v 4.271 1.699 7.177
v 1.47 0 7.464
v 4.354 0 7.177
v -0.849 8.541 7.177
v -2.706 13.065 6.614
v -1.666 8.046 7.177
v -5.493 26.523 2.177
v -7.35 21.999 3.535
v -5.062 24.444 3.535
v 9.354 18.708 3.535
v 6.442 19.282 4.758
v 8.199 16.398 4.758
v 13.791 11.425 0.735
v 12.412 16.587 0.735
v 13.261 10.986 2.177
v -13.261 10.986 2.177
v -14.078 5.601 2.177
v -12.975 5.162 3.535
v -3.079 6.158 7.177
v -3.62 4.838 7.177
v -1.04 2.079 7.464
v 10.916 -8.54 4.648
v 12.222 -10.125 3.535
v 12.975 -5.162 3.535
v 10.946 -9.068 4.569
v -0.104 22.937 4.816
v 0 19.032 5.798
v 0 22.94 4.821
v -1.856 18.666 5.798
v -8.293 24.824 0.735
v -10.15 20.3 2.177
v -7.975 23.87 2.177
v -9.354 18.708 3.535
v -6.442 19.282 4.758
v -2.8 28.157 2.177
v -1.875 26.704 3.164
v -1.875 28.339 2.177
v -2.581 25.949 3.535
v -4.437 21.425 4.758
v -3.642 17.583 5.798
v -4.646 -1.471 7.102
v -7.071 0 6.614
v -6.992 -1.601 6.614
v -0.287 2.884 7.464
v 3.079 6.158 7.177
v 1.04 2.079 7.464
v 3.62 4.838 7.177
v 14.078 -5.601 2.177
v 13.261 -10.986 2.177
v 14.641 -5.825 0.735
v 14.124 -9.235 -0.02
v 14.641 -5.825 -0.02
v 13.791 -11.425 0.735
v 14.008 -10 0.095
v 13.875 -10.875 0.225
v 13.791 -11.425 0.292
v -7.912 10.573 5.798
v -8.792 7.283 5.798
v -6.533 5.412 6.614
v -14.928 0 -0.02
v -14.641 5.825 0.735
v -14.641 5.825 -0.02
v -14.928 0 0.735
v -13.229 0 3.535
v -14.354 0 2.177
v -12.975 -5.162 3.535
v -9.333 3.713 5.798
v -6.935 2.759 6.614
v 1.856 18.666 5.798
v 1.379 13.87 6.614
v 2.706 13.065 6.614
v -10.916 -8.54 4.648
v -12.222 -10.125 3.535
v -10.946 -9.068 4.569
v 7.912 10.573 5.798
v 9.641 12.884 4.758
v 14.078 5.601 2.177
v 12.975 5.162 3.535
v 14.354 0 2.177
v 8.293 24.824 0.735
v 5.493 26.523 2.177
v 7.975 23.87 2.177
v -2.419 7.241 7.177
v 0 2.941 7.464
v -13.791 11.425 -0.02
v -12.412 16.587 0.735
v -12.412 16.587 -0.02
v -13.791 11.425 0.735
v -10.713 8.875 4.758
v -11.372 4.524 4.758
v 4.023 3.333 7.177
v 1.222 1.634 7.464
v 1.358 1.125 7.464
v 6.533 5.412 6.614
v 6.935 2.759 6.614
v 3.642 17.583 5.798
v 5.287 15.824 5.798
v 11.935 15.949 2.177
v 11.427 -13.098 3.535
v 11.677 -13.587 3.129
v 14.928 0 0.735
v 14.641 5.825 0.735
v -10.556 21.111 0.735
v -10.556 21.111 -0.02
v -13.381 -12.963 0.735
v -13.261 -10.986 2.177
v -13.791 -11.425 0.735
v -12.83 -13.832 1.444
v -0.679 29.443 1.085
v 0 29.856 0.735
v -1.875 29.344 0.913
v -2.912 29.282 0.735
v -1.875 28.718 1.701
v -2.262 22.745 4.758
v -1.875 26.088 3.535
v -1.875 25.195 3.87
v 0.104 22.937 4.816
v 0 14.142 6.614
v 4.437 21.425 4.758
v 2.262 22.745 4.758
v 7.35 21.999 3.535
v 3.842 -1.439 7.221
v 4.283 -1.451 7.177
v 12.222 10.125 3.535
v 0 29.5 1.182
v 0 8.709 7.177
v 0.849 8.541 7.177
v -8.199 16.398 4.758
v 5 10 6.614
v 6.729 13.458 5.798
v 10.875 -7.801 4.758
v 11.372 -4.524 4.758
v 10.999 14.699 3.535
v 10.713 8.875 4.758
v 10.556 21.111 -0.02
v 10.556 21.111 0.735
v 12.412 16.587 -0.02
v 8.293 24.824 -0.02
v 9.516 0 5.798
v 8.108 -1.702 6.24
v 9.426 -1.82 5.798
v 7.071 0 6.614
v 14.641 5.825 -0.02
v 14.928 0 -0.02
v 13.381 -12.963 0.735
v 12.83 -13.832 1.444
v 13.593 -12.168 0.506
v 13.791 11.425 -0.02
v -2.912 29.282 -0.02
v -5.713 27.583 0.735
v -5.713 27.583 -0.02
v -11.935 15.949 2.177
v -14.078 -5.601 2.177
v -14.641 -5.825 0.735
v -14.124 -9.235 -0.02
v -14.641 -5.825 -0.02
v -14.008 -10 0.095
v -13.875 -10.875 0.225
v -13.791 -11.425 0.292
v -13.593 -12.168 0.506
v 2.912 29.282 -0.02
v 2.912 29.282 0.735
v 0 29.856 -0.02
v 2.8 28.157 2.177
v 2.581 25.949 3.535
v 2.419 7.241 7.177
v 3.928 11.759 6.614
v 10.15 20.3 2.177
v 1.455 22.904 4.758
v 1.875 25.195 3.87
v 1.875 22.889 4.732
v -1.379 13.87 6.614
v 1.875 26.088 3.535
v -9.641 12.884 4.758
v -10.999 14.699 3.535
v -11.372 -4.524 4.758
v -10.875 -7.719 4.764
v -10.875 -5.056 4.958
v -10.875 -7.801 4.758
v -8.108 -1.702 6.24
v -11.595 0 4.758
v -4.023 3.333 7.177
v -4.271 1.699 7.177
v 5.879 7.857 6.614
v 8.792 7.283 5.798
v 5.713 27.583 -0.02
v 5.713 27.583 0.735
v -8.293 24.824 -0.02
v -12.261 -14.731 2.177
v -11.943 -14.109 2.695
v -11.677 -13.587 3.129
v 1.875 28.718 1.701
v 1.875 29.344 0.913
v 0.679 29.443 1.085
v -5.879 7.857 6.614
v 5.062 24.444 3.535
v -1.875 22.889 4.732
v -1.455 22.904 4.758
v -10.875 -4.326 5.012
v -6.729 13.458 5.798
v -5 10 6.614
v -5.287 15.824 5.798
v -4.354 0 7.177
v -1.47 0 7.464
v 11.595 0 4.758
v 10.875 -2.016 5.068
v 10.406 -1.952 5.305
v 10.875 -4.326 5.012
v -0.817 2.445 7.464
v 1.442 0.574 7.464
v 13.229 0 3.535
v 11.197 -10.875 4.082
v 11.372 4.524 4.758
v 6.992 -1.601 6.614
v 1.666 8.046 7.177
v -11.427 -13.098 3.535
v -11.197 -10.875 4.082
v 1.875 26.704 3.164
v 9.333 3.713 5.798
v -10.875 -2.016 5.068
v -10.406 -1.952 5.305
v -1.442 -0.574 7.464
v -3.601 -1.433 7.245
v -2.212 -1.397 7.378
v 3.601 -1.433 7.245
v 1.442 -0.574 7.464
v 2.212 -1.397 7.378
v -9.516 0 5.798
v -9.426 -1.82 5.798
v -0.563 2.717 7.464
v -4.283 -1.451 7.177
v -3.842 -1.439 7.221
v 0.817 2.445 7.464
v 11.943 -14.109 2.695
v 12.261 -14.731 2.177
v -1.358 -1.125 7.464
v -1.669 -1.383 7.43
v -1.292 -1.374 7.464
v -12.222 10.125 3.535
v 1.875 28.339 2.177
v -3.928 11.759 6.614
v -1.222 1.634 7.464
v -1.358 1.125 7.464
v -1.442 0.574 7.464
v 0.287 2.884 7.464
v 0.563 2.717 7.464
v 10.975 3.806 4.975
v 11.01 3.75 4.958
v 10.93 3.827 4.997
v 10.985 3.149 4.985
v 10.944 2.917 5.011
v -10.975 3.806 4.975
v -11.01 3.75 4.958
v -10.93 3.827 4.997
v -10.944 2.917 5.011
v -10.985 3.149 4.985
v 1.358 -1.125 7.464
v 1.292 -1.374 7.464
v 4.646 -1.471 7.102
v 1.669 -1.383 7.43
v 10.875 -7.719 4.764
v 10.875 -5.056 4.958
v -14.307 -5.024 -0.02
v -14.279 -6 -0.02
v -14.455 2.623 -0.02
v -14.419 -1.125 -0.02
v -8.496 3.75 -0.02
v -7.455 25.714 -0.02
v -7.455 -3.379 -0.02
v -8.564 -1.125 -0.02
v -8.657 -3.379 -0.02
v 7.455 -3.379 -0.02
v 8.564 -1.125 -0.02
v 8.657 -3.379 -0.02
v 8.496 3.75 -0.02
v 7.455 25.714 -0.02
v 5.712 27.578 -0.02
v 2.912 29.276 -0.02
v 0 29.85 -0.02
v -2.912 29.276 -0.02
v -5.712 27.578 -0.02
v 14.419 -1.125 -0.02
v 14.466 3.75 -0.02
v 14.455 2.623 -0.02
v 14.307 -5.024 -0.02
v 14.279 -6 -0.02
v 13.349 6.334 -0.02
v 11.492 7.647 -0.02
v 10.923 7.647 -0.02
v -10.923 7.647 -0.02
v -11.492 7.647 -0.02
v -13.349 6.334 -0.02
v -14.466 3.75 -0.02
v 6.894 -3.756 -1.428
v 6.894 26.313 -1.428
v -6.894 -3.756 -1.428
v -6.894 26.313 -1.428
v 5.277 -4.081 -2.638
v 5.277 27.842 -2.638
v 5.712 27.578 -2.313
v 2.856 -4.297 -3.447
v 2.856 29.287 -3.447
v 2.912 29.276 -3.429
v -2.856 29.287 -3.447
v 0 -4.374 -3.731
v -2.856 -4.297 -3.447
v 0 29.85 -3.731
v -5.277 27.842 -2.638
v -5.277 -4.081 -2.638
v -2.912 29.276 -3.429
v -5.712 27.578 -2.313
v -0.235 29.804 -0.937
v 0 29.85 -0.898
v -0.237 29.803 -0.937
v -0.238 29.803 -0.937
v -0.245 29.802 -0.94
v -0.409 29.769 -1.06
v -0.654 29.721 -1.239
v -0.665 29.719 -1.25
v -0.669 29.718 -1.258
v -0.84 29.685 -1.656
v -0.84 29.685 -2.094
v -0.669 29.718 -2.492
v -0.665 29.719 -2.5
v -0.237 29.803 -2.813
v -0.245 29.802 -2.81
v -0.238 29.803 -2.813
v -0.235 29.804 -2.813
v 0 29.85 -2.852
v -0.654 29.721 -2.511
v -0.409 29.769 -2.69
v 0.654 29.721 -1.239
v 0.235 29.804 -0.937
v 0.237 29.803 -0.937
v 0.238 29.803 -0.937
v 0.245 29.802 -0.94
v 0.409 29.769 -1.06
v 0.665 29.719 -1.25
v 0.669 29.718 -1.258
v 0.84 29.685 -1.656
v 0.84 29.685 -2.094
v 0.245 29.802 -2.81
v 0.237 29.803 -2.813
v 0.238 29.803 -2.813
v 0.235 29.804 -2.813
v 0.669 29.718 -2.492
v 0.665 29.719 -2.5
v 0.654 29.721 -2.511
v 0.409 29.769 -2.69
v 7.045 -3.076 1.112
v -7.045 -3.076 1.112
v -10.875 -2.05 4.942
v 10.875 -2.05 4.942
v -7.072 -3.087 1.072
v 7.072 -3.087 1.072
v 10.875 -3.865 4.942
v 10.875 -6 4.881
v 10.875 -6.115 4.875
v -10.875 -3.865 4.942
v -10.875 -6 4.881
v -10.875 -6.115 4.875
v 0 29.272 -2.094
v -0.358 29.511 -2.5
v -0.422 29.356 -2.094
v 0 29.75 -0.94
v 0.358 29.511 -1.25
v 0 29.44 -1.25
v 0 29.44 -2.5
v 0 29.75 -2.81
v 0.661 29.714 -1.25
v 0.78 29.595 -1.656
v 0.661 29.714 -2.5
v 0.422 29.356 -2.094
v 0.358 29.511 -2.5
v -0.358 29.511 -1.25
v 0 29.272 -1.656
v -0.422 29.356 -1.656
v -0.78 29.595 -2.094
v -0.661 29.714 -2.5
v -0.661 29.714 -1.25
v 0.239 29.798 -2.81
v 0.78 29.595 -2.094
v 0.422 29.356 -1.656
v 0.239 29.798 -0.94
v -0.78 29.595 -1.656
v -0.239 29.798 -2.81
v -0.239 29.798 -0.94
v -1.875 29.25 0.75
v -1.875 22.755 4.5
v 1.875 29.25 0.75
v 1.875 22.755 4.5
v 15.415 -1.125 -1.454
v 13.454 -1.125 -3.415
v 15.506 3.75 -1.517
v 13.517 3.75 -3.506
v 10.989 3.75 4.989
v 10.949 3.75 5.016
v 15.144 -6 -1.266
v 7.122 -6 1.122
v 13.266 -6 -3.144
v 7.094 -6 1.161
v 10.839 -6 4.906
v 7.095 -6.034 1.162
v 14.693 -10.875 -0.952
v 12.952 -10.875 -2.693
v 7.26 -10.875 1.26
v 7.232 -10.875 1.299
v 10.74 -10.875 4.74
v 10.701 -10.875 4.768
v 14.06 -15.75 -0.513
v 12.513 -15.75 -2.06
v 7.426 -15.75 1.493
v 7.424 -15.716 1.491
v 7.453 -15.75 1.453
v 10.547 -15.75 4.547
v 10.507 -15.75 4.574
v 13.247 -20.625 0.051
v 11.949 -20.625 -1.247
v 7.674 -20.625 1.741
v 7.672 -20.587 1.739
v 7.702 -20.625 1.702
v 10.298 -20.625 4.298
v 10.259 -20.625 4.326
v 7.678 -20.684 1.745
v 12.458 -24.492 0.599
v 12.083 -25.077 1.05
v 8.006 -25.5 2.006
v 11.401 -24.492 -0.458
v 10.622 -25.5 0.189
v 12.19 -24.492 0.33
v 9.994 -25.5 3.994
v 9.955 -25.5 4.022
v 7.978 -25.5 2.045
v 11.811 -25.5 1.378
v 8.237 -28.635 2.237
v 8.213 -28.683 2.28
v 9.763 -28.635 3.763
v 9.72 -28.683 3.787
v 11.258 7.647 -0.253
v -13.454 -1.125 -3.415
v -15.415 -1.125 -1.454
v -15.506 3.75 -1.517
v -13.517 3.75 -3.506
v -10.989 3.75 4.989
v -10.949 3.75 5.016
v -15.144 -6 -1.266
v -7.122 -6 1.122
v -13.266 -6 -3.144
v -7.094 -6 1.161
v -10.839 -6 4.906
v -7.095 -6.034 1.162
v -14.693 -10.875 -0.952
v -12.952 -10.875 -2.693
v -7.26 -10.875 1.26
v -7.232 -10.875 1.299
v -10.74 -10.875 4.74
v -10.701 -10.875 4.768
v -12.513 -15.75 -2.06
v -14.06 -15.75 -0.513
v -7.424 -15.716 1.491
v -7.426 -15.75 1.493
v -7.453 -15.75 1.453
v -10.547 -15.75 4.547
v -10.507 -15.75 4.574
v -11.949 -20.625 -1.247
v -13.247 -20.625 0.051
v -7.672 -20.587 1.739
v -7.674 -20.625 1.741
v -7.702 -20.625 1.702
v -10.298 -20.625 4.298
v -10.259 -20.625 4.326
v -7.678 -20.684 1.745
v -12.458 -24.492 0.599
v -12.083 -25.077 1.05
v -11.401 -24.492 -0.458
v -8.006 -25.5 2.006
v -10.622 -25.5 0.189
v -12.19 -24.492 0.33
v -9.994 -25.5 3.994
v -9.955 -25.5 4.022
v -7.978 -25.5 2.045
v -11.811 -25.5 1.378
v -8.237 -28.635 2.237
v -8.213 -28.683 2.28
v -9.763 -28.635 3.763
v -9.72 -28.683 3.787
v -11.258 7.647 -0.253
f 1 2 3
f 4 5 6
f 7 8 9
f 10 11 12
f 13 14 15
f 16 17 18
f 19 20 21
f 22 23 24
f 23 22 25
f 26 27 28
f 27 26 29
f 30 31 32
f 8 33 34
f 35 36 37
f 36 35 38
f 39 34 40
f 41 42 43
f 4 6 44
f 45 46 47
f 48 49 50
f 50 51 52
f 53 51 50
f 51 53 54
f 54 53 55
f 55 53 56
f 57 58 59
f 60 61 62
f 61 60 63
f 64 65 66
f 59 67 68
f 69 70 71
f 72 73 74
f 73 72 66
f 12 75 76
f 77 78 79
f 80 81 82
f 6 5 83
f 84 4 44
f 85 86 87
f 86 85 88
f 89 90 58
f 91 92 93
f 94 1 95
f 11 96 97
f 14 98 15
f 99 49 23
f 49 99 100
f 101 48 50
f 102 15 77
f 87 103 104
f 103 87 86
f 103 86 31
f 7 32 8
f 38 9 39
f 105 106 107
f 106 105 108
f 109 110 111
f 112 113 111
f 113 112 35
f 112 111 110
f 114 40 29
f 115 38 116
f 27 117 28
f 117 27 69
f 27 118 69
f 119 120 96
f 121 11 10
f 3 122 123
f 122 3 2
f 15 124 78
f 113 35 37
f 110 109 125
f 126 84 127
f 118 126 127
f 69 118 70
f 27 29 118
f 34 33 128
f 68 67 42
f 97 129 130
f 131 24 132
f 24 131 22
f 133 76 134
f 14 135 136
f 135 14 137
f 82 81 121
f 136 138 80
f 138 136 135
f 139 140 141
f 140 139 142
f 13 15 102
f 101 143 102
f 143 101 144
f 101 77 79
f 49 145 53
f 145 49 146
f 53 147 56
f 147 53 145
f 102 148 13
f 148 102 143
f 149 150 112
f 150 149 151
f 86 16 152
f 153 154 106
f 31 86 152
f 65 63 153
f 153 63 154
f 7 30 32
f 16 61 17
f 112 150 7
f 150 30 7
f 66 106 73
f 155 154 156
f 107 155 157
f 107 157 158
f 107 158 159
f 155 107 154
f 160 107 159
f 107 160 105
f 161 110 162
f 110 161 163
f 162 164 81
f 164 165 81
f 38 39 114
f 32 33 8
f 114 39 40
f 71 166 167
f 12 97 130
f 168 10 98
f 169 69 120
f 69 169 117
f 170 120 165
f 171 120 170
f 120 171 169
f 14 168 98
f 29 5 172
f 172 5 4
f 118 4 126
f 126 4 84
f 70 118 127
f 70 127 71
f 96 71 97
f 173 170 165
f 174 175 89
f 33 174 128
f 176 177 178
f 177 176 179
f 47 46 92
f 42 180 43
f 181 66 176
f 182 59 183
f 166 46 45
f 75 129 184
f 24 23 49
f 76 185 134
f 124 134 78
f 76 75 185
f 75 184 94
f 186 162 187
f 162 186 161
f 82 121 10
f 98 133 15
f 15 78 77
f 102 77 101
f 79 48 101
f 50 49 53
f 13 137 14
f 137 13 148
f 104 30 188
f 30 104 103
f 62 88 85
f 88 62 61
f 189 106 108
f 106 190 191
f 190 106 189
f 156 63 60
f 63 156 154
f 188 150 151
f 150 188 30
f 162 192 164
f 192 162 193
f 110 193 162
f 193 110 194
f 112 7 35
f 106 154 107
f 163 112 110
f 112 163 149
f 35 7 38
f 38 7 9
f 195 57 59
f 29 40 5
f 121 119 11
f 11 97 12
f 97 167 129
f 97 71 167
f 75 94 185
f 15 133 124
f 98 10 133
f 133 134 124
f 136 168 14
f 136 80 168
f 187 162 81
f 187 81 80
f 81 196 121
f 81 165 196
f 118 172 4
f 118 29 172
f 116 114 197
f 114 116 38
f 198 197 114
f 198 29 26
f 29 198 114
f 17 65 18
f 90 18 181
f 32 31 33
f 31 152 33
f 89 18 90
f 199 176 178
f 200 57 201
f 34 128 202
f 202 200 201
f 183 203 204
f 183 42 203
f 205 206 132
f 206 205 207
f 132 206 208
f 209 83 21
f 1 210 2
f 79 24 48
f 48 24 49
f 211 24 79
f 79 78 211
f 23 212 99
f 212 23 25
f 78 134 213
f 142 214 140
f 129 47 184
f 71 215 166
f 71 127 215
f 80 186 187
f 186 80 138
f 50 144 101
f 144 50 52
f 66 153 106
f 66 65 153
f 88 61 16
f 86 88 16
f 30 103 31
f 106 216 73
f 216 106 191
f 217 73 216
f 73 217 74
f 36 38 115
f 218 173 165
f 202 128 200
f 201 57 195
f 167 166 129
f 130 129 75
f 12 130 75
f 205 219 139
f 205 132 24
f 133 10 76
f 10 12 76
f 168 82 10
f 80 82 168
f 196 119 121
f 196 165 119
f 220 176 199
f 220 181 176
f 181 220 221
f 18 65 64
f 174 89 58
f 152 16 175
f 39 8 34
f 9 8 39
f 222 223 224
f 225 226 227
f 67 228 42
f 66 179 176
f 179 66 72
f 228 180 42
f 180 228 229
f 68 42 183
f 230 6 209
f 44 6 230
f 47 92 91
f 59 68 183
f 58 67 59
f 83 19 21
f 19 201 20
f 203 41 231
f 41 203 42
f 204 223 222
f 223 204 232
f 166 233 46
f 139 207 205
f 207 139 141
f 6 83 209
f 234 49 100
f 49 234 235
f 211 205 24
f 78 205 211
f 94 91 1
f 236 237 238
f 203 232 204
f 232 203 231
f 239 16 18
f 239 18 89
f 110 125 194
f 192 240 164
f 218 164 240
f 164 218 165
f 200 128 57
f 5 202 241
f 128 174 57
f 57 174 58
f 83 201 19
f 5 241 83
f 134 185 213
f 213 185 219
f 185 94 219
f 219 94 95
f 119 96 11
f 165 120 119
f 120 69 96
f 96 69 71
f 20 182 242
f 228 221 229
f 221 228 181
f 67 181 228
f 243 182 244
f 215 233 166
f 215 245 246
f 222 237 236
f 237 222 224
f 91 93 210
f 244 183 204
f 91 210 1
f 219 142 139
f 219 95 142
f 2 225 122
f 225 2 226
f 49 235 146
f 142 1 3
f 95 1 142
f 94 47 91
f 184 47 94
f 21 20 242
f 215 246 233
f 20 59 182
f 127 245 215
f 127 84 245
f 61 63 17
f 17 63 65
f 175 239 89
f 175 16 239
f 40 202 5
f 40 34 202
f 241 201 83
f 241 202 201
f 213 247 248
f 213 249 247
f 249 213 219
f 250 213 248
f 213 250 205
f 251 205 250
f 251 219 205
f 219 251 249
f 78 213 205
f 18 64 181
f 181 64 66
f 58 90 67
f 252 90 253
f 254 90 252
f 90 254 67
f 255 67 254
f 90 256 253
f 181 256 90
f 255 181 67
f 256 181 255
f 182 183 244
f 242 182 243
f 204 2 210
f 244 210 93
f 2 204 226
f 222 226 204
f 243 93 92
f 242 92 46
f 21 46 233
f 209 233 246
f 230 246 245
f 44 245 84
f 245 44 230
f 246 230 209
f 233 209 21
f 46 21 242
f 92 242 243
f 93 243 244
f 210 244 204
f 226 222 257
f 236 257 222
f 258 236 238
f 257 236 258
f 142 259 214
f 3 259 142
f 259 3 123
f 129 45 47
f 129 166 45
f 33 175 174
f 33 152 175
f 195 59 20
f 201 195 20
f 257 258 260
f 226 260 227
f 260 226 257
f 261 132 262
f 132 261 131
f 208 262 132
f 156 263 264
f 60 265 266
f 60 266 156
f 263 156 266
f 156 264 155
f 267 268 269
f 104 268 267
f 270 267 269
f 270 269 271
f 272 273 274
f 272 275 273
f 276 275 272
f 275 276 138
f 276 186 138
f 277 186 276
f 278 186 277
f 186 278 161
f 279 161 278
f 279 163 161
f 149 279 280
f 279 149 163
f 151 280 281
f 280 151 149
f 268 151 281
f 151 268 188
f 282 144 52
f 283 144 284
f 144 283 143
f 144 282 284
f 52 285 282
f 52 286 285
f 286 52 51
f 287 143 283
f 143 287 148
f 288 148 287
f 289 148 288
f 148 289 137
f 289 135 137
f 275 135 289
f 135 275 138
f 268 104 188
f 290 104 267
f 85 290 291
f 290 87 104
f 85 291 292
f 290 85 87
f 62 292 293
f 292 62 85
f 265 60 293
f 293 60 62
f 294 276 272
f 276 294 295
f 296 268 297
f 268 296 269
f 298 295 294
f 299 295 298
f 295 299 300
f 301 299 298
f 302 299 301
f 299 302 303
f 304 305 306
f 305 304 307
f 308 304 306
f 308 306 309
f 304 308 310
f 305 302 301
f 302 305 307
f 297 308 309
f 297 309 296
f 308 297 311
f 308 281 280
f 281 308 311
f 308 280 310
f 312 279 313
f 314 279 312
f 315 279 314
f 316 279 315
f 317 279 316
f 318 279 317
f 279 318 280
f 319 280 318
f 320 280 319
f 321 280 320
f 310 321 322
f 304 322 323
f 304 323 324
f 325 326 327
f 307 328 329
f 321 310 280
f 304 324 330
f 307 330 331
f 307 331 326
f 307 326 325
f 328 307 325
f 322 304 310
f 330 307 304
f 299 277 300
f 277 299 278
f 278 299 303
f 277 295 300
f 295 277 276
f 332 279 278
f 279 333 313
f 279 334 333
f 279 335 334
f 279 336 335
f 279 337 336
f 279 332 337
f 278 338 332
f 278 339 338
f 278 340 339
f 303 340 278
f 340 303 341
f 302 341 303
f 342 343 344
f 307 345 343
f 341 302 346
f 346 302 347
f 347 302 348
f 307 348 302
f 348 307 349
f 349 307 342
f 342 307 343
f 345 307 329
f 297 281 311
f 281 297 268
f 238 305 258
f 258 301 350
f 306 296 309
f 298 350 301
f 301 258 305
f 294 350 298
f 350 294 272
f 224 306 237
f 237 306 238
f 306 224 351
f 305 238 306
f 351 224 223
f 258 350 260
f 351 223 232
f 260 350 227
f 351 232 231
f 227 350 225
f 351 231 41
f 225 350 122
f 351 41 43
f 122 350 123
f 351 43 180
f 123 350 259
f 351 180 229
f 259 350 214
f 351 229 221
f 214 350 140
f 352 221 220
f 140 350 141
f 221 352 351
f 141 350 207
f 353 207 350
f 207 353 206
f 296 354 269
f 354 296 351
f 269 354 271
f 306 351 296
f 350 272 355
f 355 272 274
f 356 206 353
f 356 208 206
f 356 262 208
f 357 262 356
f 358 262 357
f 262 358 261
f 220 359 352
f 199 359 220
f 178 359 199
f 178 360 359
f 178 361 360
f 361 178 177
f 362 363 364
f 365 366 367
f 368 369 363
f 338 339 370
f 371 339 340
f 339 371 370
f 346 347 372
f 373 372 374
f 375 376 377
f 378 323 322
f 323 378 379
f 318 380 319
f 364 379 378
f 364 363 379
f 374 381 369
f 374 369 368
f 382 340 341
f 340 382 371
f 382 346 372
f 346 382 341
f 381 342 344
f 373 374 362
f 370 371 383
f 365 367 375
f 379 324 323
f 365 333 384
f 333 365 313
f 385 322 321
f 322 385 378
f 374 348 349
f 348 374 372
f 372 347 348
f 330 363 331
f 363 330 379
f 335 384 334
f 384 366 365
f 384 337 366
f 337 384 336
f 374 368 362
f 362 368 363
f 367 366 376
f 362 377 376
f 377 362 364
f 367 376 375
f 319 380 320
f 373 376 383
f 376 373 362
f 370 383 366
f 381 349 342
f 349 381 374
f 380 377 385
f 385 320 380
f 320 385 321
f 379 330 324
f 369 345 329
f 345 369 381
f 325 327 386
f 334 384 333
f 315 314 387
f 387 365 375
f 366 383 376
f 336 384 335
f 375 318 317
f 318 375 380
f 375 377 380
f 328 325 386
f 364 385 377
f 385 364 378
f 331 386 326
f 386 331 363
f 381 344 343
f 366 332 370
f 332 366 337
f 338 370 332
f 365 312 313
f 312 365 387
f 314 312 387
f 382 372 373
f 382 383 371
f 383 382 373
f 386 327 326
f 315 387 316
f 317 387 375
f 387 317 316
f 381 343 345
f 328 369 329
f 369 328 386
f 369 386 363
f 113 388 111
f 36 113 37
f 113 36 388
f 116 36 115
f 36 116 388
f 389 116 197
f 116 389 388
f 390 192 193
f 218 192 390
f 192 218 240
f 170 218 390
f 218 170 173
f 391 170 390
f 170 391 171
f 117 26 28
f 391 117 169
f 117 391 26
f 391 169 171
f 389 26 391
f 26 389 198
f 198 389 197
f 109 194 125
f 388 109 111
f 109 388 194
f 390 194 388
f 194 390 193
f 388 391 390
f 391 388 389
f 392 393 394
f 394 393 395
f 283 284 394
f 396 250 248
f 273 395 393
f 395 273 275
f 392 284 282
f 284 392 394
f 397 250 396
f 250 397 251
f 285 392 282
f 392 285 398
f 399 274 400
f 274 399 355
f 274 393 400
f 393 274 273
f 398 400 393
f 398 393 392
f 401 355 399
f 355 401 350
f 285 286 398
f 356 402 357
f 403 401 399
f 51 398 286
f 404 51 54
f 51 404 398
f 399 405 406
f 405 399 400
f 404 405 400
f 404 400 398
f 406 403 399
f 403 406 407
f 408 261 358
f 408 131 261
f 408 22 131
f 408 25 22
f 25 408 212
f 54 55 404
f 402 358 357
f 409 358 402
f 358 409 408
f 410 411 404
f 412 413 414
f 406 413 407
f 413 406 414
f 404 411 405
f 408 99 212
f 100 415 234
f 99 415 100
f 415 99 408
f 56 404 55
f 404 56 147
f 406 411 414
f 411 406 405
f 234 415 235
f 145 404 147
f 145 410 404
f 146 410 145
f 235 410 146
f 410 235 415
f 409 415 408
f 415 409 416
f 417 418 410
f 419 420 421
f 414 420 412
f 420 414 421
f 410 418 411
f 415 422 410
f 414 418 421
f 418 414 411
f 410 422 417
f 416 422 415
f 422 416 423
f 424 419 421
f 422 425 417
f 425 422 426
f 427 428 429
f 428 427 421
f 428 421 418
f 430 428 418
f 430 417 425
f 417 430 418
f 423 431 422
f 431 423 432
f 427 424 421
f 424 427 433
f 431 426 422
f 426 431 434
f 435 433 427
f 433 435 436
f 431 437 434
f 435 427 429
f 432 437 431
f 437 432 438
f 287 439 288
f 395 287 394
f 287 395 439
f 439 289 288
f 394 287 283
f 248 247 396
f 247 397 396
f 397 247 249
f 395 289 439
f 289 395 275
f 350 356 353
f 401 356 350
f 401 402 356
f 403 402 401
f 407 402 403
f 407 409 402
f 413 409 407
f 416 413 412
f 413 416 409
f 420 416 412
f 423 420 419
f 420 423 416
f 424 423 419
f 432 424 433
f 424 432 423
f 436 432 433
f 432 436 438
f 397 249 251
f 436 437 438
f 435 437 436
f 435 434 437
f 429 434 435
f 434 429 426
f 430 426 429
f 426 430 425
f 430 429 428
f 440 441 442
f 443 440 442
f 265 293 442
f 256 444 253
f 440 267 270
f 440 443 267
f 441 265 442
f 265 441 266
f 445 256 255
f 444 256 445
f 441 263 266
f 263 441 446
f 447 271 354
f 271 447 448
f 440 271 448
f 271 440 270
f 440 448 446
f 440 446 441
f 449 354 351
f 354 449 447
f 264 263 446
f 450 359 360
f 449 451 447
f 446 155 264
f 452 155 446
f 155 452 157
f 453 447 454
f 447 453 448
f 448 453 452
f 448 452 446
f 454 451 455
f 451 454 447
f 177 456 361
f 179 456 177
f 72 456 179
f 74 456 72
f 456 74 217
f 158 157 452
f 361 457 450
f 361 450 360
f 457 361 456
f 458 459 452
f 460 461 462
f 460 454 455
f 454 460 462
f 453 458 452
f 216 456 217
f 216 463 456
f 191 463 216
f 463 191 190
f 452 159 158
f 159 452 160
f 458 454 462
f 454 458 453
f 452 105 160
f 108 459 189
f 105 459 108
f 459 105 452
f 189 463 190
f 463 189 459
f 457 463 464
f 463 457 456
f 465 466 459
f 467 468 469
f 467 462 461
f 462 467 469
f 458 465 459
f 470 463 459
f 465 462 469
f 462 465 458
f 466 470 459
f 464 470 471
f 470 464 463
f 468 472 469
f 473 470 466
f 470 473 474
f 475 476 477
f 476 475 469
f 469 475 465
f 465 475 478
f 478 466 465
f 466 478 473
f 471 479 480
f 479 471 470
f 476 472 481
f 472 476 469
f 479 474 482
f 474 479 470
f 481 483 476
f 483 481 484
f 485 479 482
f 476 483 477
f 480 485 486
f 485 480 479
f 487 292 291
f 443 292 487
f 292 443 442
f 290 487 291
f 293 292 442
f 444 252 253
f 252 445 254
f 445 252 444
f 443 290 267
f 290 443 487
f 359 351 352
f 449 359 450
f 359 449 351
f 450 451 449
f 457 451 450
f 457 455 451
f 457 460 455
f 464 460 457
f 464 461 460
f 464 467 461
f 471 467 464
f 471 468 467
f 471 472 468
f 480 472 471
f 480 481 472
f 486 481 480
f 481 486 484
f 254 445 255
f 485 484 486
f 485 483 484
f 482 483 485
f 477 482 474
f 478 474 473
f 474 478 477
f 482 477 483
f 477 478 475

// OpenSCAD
// file: util.scad
fn1 = 32;
fn2 = 16;

module util_half_sphere(radius, fn=fn1) {
    difference() {
        sphere(radius, $fn=fn);
        translate([0,0,-(radius+radius/19)])
            cube(2*radius+radius/10, center=true);
    }
}

function gcd(a,b) = a == b ? a : a > b ? gcd(a-b, b) : gcd(a, b-a);

module util_saucer(length, width, height, fn=fn1) {
    rad = gcd(length,gcd(width,height));
    //rad = 10;
    scale([length/(2*rad), width/(2*rad), height/rad])
        util_half_sphere(rad, fn);
}

module util_half_cylinder(length, radius, inner_fn=fn2, outer_fn=fn1) {
    maxval = max(length, 2*radius);
    intersection() {
        difference() {
            rotate([0,90,0])
                translate([0,0,-(length/2 + length/20)])
                    cylinder(length+length/10, radius, radius, $fn=inner_fn);
            
            translate([0,0,(maxval/2 + maxval/19)])
                cube(maxval+maxval/10, center=true);
        }
        
        translate([0,0,-(radius+radius/20)])
            cylinder(radius + radius/10, length/2, length/2, $fn=outer_fn);
    }
}

module util_body(length, width, height, upper_height, fn=fn1) {
    rad = gcd(length, gcd(width, upper_height));
    
    scale(.995) scale([length/(2*rad), width/(2*rad), 1])
        util_half_cylinder(2*rad, height, outer_fn=fn);
}

module util_graded_cylinder(height, radius_start, radius_end, grades=1, fn=fn1) {
    height_grade = height / grades;
    radius_grade = (radius_start - radius_end) / (grades * grades);
    for (i = [0 : 1 : grades]) {
        translate([0,0,i*height_grade])
            cylinder(height_grade, 
                     radius_start - i*radius_grade * i,
                     radius_start - (i+1) * radius_grade * (i+1),
                     $fn = fn);
    }
}

module util_nacelle(length, width, height, curved=false, up=true, front_bulge=false) {
    rad = min(width, height/2);
    grads = curved ? 6 : 1;
    scale_factor = front_bulge ? 1.1 : 1;
    direction = up ? -1 : 1;
    difference() {
        scale([1, width/ (2*rad), height/rad])
            difference() {
                union() {
                    rotate([0,-90,0])
                        rotate(30)
                            util_graded_cylinder(length-rad, rad, rad/2, grads, 6);
                    scale(scale_factor) 
                        rotate([0,90,0]) rotate(90) sphere(rad, $fn=6);
                }
                
                translate([-length/2, 0, direction * (height/2 + height/19)])
                    cube([length+length, width+width, height+height/10], center=true);
            }
        
        translate([-length-(curved?length/3:0), 0, -length/3])
            rotate([0,-45,0])
                cube(length, center=true);
    }
}

module util_mirrored(v) {
    children();
    mirror(v) children();
}

module util_ring(outer, inner, height) {
    difference() {
        translate([0,0,-height/2])
            cylinder(height, outer, outer);
        translate([0,0,-(height/2 + height/19)])
            cylinder(height+height/10, inner, inner);
    }
}

module util_star(radius, thick, num, half=false) {
    angle = 360/num;
    offset = half? angle/2 : 0;
    for (i = [0: 1: num]) {
        rotate(i* angle + offset)
            translate([radius/2,0,0])
                cube([radius, thick, thick], center=true);
    }
}

module util_hangar_disk(height, lower, upper, num, fn=fn1) {
    difference() {
            cylinder(height, lower, upper, $fn=fn, center=true);
        difference() {
            scale([1,1,22])
                util_star(1.1*upper, height/20, num, half=true);
            scale(.95)
                cylinder(height, lower, upper, $fn=fn, center=true);
        }
    }
}

module util_nacelle_bar(span, height, width, thickness) {
    rad = (span*span/(8*height) + height/2);
    outer = rad + thickness/2;
    inner = rad - thickness/2;
    difference(){
        translate([0,0,outer])
            rotate([0,90,0])
                util_ring(outer, inner, width);
    
        translate([0,0,1.1*outer+height])
            cube(2.2*outer, center=true);
    }
}
// main file
use <util.scad>;
module at_main_body() {
    util_saucer(80,40,10);
    util_body(80,40,5,10);
}

module at_main_minus() {
    translate([-14.5,-90,-10])
        rotate([-15,0,0])
            cube([29,80,80]);

    translate([0,40.5,-2.5])
        sphere(1.5, $fn=16);

    translate([-2.5,39,1])
        rotate([60,0,0])
            cube([5,5,10]);

    translate([0,-35,0])
        rotate([45,0,0])
            cube([40,10,40], center=true);
}

module at_nacelle_assembly() {
    translate([12,5,4])
        rotate([0,-45,0])
            at_nacelle_2();
    mirror([1,0,0])
        translate([12,5,4])
            rotate([0,-45,0])
                at_nacelle_2();
}

module at_nacelle_2() {
    rotate(90)
        util_nacelle(45,7.5,12,curved=true,up=false);
}


module at_main() {
    union() {
        difference() {
            rotate(90) 
                at_main_body();
            at_main_minus();
        }
        at_nacelle_assembly();
    }
}

module at_msd() {
    projection(cut = true)
        rotate([-90,0,0])
            rotate(-90) union() {
                at_main();
                translate([0,5,-6])
                    at_nacelle_2();
            }
}

module attack() {
    scale(.75) at_main();
}

attack();

//at_msd();
